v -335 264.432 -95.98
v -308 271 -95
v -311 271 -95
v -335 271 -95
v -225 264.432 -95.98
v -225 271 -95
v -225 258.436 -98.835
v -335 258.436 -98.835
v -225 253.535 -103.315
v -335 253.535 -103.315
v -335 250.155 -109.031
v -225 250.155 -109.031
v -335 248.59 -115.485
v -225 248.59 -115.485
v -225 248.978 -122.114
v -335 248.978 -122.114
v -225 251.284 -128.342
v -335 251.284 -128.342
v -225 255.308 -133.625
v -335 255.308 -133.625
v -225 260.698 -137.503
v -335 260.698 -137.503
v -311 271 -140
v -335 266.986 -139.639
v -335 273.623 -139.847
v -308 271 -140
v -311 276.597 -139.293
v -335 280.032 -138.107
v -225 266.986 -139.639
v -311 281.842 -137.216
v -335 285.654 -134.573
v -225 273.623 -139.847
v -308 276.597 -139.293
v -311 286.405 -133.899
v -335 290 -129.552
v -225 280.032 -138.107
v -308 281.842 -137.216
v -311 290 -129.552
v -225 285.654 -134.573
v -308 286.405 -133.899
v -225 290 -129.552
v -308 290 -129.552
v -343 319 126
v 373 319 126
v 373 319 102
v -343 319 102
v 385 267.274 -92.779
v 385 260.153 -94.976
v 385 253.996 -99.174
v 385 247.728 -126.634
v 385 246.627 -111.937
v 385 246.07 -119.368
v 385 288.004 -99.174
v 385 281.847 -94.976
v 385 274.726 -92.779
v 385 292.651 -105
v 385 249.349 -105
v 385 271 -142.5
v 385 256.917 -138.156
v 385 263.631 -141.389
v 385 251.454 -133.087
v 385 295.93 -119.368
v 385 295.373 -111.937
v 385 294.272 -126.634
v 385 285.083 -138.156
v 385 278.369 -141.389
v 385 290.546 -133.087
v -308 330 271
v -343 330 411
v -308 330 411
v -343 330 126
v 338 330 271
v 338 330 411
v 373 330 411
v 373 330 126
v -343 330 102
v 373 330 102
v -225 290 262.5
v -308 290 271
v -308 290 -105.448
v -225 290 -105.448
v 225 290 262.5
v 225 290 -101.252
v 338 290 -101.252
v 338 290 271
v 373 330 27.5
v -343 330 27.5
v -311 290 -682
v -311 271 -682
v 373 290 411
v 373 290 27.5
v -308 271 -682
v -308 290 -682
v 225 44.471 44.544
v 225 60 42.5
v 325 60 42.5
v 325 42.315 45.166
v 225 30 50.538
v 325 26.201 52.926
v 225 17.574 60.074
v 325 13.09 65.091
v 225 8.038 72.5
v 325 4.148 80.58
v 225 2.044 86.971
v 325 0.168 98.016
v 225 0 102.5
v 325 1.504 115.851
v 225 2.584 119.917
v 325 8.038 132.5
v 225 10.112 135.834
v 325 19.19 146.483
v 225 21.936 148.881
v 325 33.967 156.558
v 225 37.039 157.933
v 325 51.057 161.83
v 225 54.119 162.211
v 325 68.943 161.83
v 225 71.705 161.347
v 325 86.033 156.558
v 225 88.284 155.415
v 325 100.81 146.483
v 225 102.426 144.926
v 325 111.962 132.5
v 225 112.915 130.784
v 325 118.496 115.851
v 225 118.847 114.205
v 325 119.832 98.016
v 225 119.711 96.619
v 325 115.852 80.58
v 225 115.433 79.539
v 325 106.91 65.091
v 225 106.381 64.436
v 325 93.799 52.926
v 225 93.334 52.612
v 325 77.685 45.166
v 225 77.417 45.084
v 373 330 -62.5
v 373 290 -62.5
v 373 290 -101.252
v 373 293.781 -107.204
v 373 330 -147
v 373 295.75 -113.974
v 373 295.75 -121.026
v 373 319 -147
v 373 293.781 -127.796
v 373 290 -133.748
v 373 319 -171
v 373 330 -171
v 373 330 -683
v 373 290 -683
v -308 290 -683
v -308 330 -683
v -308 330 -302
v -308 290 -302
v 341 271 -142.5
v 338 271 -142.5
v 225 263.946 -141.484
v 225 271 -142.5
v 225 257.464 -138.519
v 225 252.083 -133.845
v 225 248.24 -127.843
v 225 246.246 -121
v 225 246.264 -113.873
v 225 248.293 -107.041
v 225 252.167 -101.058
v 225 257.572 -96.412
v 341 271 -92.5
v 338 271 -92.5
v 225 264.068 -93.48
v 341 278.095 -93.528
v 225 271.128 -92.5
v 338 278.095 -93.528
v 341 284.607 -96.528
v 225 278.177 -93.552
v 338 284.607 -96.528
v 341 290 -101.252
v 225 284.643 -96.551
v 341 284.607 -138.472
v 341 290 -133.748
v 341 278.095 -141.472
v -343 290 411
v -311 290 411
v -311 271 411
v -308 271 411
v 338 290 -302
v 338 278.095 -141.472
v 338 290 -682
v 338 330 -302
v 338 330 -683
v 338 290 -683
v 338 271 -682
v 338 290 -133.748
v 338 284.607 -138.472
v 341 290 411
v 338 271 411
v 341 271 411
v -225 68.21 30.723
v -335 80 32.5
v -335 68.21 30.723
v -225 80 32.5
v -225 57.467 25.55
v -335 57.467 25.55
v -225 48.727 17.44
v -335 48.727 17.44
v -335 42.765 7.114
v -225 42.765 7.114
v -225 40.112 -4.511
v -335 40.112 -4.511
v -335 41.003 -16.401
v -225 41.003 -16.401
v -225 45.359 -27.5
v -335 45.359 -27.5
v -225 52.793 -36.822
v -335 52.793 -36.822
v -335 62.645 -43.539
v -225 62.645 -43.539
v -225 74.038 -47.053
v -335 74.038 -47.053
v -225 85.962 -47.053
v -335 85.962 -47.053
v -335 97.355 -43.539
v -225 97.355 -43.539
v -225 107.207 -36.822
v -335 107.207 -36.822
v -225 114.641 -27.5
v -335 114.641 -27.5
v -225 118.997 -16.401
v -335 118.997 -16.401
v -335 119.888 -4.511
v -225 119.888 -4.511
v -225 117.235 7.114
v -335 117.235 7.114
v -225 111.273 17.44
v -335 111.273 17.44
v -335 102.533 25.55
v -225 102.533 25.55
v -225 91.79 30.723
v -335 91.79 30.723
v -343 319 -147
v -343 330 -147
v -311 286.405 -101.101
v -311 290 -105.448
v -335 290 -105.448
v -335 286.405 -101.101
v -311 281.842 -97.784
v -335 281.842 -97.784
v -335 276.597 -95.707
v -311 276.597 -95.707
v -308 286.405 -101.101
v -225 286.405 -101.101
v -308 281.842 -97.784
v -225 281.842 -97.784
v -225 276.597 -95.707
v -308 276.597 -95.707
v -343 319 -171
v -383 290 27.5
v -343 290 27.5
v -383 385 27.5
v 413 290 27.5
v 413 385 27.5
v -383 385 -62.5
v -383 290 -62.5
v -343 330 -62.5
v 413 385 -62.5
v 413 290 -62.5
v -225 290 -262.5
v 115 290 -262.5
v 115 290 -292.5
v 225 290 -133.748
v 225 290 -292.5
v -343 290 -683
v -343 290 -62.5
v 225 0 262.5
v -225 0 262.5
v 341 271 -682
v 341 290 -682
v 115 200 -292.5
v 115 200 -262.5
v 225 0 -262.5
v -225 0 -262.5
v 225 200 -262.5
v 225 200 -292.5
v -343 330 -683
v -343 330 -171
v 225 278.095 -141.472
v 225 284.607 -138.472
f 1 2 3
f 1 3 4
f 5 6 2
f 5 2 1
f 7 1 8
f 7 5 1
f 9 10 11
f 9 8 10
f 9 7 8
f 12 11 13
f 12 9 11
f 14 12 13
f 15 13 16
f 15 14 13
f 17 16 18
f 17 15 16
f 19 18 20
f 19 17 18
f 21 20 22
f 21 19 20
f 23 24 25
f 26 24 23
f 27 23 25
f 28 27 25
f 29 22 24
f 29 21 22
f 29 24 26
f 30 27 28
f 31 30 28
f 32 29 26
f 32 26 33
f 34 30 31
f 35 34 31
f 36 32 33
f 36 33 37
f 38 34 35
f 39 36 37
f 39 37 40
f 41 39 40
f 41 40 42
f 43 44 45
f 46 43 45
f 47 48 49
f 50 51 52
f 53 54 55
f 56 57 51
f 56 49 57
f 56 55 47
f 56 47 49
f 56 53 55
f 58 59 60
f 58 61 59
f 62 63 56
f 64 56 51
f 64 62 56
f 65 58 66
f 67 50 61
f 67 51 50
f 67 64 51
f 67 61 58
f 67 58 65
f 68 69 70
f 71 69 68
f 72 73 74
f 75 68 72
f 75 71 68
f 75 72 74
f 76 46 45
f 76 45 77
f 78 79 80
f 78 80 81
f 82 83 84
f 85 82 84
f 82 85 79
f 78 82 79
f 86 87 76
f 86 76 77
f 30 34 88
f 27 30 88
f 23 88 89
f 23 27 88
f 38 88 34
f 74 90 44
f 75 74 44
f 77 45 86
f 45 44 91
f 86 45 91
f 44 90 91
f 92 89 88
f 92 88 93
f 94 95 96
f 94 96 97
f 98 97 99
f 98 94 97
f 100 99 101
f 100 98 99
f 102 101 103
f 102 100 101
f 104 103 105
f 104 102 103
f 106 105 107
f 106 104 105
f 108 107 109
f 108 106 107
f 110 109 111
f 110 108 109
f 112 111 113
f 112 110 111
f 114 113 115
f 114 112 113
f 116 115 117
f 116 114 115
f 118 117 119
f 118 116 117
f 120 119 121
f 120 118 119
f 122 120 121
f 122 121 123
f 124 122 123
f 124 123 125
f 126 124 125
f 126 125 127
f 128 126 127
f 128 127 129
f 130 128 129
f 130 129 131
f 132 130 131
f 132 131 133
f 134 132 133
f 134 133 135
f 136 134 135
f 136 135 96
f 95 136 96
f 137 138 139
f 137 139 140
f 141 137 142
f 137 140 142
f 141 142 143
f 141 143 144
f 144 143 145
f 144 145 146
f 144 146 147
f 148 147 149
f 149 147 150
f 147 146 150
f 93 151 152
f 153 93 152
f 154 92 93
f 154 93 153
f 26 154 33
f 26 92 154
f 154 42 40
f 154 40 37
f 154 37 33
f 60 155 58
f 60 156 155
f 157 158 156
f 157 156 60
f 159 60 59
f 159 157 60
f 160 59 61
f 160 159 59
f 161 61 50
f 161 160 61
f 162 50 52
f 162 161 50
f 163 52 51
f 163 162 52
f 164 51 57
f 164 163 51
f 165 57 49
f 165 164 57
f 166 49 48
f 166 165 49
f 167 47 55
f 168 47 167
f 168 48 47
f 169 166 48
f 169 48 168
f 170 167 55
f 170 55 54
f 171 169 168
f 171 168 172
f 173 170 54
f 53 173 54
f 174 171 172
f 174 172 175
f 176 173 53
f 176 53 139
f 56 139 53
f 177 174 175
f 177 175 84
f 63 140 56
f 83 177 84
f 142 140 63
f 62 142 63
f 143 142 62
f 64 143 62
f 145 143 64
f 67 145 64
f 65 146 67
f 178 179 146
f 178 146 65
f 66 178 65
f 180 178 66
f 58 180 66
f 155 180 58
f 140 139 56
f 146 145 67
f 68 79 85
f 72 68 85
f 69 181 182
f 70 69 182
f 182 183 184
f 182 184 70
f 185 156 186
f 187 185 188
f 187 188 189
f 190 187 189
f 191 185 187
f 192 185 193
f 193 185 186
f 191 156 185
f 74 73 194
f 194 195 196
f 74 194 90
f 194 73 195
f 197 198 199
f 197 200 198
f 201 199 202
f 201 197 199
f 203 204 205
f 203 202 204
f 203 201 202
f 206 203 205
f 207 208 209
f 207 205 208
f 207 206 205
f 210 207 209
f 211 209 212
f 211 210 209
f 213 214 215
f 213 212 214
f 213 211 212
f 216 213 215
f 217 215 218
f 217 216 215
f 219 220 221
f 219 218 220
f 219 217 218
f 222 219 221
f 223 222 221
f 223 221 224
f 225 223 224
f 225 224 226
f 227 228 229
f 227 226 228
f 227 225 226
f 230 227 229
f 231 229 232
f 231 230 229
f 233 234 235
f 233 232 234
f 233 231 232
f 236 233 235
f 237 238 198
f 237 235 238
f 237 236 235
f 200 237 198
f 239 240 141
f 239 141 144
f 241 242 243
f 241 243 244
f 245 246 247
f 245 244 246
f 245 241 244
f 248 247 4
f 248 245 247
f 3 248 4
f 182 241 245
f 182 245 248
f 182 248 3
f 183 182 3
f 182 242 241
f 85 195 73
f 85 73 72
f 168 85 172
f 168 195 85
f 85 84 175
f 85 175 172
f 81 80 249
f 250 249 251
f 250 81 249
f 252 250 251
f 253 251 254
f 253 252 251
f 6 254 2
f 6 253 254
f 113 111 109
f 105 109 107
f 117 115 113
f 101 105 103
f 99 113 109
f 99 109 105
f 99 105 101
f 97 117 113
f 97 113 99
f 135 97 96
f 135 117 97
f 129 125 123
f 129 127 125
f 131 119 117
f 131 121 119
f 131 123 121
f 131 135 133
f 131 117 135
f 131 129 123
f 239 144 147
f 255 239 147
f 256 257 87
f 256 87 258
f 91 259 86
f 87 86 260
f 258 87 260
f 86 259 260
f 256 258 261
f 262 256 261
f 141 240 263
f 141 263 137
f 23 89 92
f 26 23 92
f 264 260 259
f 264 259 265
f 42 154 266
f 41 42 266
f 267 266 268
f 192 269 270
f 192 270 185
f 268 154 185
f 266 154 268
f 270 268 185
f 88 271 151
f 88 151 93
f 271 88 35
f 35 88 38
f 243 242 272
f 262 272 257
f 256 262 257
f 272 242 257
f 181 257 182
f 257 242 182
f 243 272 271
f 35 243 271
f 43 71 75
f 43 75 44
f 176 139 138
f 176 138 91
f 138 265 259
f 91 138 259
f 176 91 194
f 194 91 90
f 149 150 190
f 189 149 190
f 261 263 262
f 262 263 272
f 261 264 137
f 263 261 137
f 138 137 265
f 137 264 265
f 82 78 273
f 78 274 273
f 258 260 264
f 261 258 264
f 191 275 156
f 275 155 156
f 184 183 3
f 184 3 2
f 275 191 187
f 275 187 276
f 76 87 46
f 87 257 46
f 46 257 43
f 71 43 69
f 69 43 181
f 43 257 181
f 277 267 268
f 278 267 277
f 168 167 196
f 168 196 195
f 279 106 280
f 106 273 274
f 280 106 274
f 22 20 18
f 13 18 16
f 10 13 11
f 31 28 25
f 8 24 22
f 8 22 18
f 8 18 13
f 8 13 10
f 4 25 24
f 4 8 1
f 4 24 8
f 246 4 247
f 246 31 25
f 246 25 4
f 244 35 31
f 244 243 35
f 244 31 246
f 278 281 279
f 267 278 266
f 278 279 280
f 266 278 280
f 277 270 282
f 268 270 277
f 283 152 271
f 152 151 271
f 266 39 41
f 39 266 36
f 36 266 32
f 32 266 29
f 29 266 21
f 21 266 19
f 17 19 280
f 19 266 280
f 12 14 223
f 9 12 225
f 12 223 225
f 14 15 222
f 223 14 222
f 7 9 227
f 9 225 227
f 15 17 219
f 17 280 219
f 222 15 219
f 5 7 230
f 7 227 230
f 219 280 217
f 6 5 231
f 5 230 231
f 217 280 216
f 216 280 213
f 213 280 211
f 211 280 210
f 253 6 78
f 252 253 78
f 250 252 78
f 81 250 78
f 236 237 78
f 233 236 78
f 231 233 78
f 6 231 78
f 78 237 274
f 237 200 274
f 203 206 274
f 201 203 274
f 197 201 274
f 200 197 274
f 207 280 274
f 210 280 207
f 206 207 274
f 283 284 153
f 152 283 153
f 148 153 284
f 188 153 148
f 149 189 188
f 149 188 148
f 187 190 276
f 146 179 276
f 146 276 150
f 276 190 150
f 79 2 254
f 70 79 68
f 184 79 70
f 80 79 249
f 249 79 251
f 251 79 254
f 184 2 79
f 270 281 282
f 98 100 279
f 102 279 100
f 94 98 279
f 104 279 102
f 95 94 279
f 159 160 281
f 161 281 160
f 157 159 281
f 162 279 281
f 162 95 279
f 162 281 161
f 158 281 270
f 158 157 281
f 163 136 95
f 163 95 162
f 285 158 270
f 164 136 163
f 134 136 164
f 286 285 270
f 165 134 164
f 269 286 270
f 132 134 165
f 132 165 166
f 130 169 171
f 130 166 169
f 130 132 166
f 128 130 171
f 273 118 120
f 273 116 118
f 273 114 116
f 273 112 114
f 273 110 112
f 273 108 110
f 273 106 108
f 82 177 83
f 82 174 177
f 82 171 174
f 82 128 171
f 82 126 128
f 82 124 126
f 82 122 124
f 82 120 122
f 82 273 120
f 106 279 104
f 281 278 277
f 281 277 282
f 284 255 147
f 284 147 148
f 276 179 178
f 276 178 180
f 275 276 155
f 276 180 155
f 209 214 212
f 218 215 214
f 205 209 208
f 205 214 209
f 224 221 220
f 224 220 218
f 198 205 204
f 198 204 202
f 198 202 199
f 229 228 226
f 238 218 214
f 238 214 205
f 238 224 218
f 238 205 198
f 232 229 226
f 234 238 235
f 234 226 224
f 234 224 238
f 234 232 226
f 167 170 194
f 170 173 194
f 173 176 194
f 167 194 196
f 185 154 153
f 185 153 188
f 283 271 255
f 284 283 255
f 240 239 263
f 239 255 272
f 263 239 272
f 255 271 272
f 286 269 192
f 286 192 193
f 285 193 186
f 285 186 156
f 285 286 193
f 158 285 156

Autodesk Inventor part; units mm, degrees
ref_plane "YZ Plane" through (0, 0, 0) normal (1, 0, 0) x (0, 1, 0)
ref_plane "XZ Plane" through (0, 0, 0) normal (0, 1, 0) x (-1, 0, 0)
ref_plane "XY Plane" through (0, 0, 0) normal (0, 0, 1) x (1, 0, 0)
sketch "Esquisse1" plane through (0, 0, 0) normal (0, 1, 0) x (-1, 0, 0)
  line L0 (-225, -262.5) -> (225, -262.5)
  line L1 (225, -262.5) -> (225, 262.5)
  line L2 (225, 262.5) -> (-225, 262.5)
  line L3 (-225, 262.5) -> (-225, -262.5)
  line L4 (-225, -262.5) -> (225, 262.5) construction
  line L5 (225, -262.5) -> (-225, 262.5) construction
  point P0 (0, 0)
  dimension "d0" = 525
  dimension "d1" = 450
extrude "Extrusion1" add sketch "Esquisse1" along normal blind 290
sketch "Esquisse2" plane through (0, 290, 0) normal (0, 1, 0) x (1, 0, 0)
  line L0 (-343, 683) -> (-343, -411)
  line L1 (-343, -411) -> (-308, -411)
  line L2 (373, -411) -> (373, 683)
  line L3 (-308, -411) -> (-308, -271)
  line L4 (-308, -271) -> (338, -271)
  line L5 (338, -271) -> (338, -411)
  line L6 (-308, 683) -> (-308, 302)
  line L7 (-308, 302) -> (338, 302)
  line L8 (338, 302) -> (338, 683)
  line L9 (373, 683) -> (338, 683)
  line L10 (-308, 683) -> (-343, 683)
  line L11 (338, -411) -> (373, -411)
  line L12 (-225, 262.5) -> (-225, -262.5) construction
  line L13 (225, -262.5) -> (225, 262.5) construction
  line L14 (225, 262.5) -> (-225, 262.5) construction
  line L15 (-225, -262.5) -> (225, -262.5) construction
  point P0 (0, 0)
  dimension "d4" = 646
  dimension "d5" = 573
  dimension "d6" = 140
  dimension "d7" = 381
  dimension "d8" = 35
  dimension "d9" = 35
  dimension "d10" = 118
  dimension "d11" = 148
  dimension "d12" = 1094
  dimension "d13" = 39.5
  dimension "d14" = 8.5
  dimension "d15" = 525
extrude "Extrusion2" add sketch "Esquisse2" along normal blind 40
sketch "Esquisse3" plane through (338, 290, 411) normal (0, 0, 1) x (1, 0, 0)
  line L0 (-646, 0) -> (0, 0) projected
  line L1 (-646, 0) -> (-649, 0)
  line L2 (-649, 0) -> (-649, -19)
  line L3 (-649, -19) -> (-646, -19)
  line L4 (-646, -19) -> (-646, 0)
  line L5 (0, 0) -> (35, 0) projected
  line L6 (0, 0) -> (3, 0)
  line L7 (3, 0) -> (3, -19)
  line L8 (3, -19) -> (0, -19)
  line L9 (0, -19) -> (0, 0)
  line L10 (0, 40) -> (35, 40) projected
  point P0 (-338, -290)
  point P1 (3, 0)
  dimension "d18" = 59
  dimension "d19" = 3
extrude "Extrusion3" add sketch "Esquisse3" against normal blind 1093
sketch "Esquisse4" plane through (-225, 0, -262.5) normal (-1, 0, 0) x (0, 0, 1)
  circle A0 centre (255, 80) radius 40
  line L0 (0, 0) -> (0, 290) projected
  line L1 (0, 0) -> (525, 0) projected
  line L2 (525, 0) -> (525, 290) projected
  point P0 (262.5, 0)
  dimension "d23" = 80
  dimension "d24" = 255
  dimension "d25" = 80
  dimension "d26" = 270
extrude "Extrusion4" add sketch "Esquisse4" along normal blind 110
sketch "Esquisse5" plane through (225, 0, -262.5) normal (0, 0, -1) x (-1, 0, 0)
  line L0 (0, 0) -> (0, 290) projected
  line L1 (0, 290) -> (110, 290)
  line L2 (110, 290) -> (110, 200)
  line L3 (110, 200) -> (0, 200)
  line L4 (0, 200) -> (0, 290)
  point P0 (225, 0)
  point P1 (0, 200)
  dimension "d29" = 90
  dimension "d30" = 110
extrude "Extrusion5" add sketch "Esquisse5" along normal blind 30
sketch "Esquisse6" plane through (225, 0, 262.5) normal (1, 0, 0) x (0, 0, -1)
  circle A0 centre (160, 60) radius 60
  line L0 (0, 0) -> (0, 290) projected
  line L1 (0, 0) -> (525, 0) projected
  point P0 (262.5, 0)
  dimension "d33" = 120
  dimension "d34" = 160
  dimension "d35" = 60
extrude "Extrusion6" add sketch "Esquisse6" along normal blind 100
sketch "Esquisse8" plane through (225, 0, 262.5) normal (1, 0, 0) x (0, 0, -1)
  circle A0 centre (380, 271) radius 25
  line L0 (525, 0) -> (525, 200) projected
  line L1 (-148.5, 271) -> (944.5, 271) projected
  point P0 (262.5, 0)
  point P1 (945.5, 271)
  dimension "d38" = 50
  dimension "d39" = 145
extrude "Extrusion7" add sketch "Esquisse8" along normal blind 160
sketch "Esquisse9" plane through (-225, 0, -262.5) normal (-1, 0, 0) x (0, 0, 1)
  arc A0 (128.7519, 290) -> (161.2481, 290) centre (145, 271) ccw projected
  circle A1 centre (145, 271) radius 22.5
  point P0 (262.5, 0)
  dimension "d42" = 45
extrude "Extrusion8" add sketch "Esquisse9" along normal blind 110
ref_plane "Plan de construction1" through (15, 290, -683) normal (1, 0, 0) x (0, 0, -1)
ref_plane "Plan de construction2" through (338, 290, -15.5) normal (0, 0, -1) x (-1, 0, 0)
ref_plane "Plan de construction3" through (413, 290, -683) normal (1, 0, 0) x (0, 0, -1)
sketch "Esquisse10" plane through (413, 290, -683) normal (1, 0, 0) x (0, 0, -1)
  line L0 (-620.5, 0) -> (-710.5, 0)
  line L1 (-710.5, 0) -> (-710.5, 95)
  line L2 (-710.5, 95) -> (-620.5, 95)
  line L3 (-620.5, 95) -> (-620.5, 0)
  line L4 (-549.2519, 0) -> (0, 0) projected
  line L5 (-390.5, 0) -> (-390.5, -90) projected
  line L6 (-420.5, -290) -> (-420.5, -90) projected
  point P0 (-683, -290)
  dimension "d46" = 90
  dimension "d47" = 95
  dimension "d50" = 200
extrude "Extrusion9" add sketch "Esquisse10" against normal blind 796
sketch "Esquisse11" plane through (-343, 290, -683) normal (-1, 0, 0) x (0, 0, 1)
  line L0 (577.552, 0) -> (945.5, 0) projected
  line L1 (785, 40) -> (809, 40)
  line L2 (809, 40) -> (809, 29)
  line L3 (809, 29) -> (785, 29)
  line L4 (785, 29) -> (785, 40)
  line L5 (945.5, -290) -> (945.5, 0) projected
  line L6 (710.5, 40) -> (1094, 40) projected
  line L7 (620.5, 40) -> (0, 40) projected
  line L8 (512, 40) -> (536, 40)
  line L9 (536, 40) -> (536, 29)
  line L10 (536, 29) -> (512, 29)
  line L11 (512, 29) -> (512, 40)
  line L12 (420.5, -290) -> (420.5, 0) projected
  line L13 (381, 0) -> (381, 40) projected
  point P0 (683, -290)
  point P1 (954, 40)
  dimension "d52" = 24
  dimension "d53" = 11
  dimension "d57" = 131
  dimension "d58" = 145
extrude "Extrusion10" cut sketch "Esquisse11" against normal blind 776
properties part number "SAW_DM"
